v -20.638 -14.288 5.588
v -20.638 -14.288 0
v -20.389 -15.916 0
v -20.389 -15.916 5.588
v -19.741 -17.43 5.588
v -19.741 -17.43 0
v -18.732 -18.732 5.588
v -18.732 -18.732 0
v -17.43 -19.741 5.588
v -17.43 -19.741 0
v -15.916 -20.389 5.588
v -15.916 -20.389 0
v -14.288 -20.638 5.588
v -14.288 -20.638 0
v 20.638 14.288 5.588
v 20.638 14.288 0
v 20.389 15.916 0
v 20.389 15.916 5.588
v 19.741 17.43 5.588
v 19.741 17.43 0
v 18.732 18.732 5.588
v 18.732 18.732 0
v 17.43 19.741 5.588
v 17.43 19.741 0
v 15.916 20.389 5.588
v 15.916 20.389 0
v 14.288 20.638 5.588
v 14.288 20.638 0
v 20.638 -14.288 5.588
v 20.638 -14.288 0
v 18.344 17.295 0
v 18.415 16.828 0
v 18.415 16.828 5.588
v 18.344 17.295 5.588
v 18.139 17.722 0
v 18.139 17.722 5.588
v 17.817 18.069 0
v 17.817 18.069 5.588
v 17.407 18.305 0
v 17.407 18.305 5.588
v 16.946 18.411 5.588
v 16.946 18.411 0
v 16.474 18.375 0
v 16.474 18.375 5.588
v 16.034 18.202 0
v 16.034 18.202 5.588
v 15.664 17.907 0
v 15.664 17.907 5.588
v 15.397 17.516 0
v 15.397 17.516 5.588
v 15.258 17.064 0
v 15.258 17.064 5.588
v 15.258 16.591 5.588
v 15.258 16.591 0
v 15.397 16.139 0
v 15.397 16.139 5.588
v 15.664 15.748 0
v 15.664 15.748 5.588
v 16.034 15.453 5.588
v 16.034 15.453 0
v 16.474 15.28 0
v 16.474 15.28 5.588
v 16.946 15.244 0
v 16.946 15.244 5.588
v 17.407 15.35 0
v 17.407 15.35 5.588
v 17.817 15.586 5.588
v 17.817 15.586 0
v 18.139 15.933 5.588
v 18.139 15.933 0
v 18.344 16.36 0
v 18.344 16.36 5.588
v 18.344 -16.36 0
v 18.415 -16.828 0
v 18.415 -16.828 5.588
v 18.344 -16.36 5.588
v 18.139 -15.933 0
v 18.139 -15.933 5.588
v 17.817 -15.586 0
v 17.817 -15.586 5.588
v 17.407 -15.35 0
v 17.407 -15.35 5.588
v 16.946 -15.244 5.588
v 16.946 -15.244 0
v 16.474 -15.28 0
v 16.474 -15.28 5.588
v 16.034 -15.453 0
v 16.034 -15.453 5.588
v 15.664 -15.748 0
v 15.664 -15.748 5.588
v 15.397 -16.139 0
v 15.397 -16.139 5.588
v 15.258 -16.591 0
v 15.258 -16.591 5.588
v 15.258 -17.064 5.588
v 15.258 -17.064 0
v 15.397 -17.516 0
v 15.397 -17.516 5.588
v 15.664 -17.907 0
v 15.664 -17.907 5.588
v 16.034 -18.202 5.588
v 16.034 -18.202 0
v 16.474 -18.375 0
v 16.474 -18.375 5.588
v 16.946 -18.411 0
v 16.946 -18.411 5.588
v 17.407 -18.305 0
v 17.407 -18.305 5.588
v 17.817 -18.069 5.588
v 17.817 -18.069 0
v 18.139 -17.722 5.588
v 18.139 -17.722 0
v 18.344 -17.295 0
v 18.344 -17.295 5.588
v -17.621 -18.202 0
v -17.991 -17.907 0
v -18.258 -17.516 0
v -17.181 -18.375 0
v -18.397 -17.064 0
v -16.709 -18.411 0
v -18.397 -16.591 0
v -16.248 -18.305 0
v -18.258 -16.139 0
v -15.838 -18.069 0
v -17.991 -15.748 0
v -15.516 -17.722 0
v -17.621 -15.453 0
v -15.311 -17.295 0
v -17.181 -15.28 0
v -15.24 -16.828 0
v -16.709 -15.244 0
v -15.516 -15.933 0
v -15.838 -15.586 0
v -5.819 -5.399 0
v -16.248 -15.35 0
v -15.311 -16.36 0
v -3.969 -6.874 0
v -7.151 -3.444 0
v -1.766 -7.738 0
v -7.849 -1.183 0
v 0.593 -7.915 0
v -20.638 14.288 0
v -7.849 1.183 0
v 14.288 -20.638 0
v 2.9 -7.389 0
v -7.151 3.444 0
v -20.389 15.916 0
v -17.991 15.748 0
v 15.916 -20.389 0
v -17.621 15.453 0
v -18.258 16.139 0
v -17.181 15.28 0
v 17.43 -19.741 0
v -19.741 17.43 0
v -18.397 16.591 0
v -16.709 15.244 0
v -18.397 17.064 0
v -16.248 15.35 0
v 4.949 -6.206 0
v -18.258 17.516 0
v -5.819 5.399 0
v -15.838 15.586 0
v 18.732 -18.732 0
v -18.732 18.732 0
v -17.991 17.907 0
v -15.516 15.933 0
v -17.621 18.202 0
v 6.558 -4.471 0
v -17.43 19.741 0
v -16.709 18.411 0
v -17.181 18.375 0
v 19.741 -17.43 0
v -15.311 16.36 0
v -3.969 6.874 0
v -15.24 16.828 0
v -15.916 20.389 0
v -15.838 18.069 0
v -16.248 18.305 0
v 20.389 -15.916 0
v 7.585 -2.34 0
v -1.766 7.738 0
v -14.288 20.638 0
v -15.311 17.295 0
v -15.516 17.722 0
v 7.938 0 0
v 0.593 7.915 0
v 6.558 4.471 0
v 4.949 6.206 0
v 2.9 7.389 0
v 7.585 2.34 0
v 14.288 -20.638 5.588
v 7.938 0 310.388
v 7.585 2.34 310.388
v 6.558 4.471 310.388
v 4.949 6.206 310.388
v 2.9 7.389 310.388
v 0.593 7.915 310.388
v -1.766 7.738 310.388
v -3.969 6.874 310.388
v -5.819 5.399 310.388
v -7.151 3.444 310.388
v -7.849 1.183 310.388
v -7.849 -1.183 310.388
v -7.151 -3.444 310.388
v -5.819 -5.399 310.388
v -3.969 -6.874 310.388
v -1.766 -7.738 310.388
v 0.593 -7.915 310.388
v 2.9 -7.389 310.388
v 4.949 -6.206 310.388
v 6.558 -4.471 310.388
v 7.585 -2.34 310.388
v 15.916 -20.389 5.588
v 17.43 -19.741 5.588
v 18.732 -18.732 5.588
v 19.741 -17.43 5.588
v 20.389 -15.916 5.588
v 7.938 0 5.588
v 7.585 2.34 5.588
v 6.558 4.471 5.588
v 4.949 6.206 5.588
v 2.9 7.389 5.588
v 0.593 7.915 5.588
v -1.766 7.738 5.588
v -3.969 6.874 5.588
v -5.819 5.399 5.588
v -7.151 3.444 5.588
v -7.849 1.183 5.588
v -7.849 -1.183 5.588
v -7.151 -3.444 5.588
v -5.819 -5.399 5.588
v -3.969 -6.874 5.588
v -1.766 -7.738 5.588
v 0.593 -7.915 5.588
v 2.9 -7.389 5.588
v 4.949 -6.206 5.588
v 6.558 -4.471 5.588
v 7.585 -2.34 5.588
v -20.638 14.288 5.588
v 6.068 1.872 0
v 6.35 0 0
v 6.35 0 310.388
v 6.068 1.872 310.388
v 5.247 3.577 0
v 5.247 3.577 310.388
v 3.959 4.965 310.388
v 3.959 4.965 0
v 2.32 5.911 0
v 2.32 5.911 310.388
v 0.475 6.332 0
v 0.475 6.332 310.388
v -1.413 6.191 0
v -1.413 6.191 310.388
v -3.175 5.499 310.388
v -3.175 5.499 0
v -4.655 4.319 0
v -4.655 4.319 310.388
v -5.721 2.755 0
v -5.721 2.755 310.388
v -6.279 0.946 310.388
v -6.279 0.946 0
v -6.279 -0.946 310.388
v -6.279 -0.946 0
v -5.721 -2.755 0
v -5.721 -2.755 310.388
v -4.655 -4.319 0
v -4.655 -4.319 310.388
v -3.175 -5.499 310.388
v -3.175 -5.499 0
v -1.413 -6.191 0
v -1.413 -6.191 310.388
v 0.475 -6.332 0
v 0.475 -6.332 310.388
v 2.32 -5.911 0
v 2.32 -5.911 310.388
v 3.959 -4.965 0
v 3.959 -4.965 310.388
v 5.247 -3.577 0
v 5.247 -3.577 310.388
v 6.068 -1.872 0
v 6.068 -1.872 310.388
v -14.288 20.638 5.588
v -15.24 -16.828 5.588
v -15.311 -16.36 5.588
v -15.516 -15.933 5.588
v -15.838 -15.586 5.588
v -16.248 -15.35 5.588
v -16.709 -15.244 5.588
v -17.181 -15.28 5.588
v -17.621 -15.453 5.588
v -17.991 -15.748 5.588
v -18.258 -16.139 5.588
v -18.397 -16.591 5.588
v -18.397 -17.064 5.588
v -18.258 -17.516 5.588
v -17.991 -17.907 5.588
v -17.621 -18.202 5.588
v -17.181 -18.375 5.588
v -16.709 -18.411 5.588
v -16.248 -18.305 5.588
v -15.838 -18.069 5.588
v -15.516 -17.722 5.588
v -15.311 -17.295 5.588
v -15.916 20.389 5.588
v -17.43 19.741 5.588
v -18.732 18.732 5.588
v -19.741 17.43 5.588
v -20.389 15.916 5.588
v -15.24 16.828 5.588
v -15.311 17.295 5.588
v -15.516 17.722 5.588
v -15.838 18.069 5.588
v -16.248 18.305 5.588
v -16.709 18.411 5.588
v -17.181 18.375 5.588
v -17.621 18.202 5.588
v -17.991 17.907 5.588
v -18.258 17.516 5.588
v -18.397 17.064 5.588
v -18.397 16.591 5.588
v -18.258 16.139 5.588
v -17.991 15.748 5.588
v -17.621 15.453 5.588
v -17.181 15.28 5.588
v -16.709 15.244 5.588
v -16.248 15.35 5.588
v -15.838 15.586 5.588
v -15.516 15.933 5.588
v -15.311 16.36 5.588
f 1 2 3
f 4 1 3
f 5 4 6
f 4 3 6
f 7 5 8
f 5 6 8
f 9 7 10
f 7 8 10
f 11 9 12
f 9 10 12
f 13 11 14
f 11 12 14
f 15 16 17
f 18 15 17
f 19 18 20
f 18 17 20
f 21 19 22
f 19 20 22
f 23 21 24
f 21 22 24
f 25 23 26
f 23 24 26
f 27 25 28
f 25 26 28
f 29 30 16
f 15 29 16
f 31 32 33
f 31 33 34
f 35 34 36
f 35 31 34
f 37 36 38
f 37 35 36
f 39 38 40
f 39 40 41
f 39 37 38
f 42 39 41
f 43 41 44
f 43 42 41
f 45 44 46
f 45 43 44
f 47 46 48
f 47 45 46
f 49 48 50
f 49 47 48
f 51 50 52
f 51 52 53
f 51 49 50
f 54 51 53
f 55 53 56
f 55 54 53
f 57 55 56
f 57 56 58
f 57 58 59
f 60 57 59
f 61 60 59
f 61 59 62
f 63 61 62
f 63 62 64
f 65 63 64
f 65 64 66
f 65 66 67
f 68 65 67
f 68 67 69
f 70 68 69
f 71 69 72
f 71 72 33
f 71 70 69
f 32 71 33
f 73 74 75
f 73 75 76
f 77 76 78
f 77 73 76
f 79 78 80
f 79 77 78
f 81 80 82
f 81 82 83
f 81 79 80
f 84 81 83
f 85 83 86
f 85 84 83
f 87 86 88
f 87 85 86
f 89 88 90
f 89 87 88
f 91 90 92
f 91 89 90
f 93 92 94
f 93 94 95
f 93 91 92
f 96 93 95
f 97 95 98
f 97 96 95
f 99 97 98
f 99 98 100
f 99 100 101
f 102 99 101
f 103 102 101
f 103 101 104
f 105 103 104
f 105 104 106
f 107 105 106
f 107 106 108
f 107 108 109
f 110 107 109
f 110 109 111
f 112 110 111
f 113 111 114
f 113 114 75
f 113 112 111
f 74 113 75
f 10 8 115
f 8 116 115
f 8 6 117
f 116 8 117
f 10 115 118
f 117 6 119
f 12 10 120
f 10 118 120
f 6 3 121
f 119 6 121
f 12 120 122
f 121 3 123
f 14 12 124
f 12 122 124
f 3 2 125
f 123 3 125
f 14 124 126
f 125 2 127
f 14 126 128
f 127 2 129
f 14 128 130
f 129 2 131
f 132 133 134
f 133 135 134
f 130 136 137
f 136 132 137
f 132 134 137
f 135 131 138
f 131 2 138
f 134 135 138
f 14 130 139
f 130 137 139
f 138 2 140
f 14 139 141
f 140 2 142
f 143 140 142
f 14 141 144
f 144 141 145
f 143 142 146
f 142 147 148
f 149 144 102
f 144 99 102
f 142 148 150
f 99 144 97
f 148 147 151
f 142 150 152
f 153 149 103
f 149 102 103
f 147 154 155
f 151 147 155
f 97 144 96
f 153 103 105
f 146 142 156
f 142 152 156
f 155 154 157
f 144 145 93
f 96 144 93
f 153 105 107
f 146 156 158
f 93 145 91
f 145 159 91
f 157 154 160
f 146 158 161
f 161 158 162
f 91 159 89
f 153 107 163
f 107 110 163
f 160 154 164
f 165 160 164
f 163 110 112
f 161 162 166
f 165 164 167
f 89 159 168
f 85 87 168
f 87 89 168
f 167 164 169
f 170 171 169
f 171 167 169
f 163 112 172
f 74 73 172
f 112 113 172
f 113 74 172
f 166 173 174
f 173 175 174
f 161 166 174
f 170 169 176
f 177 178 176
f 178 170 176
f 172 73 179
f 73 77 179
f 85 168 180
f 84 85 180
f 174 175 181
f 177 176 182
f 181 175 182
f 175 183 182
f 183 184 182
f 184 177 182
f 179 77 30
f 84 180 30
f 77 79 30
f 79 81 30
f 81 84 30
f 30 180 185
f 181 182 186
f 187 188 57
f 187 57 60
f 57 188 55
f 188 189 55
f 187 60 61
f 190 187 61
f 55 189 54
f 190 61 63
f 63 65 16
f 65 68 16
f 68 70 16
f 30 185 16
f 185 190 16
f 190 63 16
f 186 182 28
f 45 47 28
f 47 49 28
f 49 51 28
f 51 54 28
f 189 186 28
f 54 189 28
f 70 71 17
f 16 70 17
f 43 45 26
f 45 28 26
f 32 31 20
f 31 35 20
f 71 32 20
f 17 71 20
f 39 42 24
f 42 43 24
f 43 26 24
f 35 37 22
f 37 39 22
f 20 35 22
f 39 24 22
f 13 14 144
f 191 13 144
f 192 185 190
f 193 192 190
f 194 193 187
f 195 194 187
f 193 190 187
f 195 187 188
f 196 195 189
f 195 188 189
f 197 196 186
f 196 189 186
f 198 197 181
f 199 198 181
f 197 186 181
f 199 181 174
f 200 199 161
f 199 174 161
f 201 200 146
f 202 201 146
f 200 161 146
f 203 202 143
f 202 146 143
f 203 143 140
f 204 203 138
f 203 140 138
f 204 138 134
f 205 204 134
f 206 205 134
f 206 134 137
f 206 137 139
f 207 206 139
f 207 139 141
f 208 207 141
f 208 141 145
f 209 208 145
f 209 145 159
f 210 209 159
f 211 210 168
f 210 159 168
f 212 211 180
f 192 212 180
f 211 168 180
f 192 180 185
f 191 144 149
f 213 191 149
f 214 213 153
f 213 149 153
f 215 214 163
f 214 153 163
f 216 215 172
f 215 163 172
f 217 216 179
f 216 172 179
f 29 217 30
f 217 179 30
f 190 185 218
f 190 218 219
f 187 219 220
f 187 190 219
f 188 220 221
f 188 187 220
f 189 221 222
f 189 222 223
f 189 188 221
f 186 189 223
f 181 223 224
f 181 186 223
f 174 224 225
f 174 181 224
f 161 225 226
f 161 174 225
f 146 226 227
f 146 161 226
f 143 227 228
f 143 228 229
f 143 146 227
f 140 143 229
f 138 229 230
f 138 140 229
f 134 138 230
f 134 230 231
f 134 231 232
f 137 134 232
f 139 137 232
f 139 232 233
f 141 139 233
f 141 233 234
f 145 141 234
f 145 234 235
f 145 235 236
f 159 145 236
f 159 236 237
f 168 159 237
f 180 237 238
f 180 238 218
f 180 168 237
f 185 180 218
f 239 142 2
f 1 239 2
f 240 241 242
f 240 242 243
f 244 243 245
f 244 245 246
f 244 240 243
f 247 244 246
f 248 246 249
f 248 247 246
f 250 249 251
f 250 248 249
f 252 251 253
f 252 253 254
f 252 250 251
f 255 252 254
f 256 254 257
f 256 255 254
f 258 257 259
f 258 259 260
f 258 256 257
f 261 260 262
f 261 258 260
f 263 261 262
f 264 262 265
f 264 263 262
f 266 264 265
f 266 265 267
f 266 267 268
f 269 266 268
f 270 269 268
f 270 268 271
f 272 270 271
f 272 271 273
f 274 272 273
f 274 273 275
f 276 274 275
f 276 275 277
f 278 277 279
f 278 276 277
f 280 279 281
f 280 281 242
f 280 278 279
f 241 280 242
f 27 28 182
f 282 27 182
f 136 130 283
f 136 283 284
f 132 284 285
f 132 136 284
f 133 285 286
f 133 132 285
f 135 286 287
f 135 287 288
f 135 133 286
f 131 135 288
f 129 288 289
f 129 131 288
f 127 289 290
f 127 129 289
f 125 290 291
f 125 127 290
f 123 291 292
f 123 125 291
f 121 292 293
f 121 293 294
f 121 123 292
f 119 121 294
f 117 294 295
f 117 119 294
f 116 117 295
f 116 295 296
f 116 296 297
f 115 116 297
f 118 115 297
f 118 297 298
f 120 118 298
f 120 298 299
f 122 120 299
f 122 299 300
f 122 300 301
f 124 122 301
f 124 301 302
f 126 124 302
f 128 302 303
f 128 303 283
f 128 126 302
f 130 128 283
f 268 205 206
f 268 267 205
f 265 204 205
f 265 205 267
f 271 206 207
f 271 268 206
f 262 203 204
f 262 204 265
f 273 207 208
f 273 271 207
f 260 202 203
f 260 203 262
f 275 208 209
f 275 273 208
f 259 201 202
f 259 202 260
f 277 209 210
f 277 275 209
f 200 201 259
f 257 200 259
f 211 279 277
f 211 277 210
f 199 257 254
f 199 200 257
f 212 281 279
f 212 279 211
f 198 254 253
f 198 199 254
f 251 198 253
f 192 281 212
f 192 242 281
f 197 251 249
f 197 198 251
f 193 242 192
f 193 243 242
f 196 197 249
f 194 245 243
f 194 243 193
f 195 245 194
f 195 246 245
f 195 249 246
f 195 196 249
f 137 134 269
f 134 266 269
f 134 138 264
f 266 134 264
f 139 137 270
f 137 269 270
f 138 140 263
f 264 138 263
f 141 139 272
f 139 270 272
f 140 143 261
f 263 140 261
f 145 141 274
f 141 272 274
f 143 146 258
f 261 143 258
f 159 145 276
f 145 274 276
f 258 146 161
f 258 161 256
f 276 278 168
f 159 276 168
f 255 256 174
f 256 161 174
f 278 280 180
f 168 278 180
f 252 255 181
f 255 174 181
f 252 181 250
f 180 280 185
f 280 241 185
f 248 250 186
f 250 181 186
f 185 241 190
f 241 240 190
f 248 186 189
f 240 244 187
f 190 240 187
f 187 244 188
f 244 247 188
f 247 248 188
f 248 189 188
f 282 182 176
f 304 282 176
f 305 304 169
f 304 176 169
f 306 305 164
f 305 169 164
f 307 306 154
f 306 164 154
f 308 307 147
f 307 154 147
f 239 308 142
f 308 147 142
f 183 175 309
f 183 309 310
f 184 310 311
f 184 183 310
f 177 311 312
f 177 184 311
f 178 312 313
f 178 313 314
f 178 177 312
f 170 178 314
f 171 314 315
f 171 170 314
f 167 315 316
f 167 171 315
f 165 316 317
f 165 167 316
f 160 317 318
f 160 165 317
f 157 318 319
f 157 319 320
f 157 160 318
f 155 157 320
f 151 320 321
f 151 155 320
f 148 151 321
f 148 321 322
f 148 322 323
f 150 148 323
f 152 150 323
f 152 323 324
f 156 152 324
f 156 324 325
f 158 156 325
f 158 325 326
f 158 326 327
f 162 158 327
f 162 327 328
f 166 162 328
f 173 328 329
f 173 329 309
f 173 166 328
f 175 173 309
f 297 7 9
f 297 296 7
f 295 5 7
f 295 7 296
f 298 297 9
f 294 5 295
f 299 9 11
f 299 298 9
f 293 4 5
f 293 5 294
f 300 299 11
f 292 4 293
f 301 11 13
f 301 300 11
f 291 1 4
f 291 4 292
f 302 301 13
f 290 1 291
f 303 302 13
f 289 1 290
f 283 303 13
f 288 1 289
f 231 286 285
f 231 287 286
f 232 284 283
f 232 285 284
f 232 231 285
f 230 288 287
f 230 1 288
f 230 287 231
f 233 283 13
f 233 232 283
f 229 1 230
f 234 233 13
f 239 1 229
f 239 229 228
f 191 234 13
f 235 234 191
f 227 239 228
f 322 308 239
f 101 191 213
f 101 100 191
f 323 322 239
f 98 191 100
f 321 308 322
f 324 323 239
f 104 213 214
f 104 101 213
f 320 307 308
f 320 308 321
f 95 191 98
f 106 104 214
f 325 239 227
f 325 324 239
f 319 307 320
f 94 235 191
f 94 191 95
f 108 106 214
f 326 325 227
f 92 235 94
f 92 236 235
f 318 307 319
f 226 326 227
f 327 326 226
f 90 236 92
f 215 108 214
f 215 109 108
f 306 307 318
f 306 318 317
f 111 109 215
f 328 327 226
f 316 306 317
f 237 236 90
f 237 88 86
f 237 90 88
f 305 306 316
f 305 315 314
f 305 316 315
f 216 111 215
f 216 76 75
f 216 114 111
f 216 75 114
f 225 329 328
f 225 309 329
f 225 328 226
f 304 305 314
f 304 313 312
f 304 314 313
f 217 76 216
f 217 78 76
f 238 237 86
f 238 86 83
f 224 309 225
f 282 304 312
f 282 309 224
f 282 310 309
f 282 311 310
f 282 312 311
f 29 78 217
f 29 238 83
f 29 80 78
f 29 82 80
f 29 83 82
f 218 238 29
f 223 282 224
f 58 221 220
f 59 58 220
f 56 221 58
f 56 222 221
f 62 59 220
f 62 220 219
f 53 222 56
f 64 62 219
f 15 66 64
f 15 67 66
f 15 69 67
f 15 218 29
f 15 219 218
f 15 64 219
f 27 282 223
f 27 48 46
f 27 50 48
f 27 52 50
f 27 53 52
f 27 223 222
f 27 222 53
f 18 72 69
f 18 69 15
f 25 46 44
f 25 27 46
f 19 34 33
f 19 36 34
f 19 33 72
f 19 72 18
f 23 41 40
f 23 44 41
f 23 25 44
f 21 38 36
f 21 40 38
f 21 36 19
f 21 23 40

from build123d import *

# Parameters (mm, degrees)
F0_R     = 1.5875
F0_R_2   = 7.9375
F1_DEPTH = 5.588
F0_R_3   = 6.35
F2_DEPTH = 310.388


with BuildPart() as f1:
    # F0 (on Top) → F1 (new body)
    with BuildSketch(Plane.XY):
        with BuildLine():
            Line((14.2875, 20.6375), (-14.2875, 20.6375))
            ThreePointArc((-14.2875, 20.6375), (-18.7325, 18.7325), (-20.6375, 14.2875))
            Line((-20.6375, 14.2875), (-20.6375, -14.2875))
            ThreePointArc((-20.6375, -14.2875), (-18.7325, -18.7325), (-14.2875, -20.6375))
            Line((-14.2875, -20.6375), (14.2875, -20.6375))
            ThreePointArc((14.2875, -20.6375), (18.7325, -18.7325), (20.6375, -14.2875))
            Line((20.6375, -14.2875), (20.6375, 14.2875))
            ThreePointArc((20.6375, 14.2875), (18.7325, 18.7325), (14.2875, 20.6375))
        make_face()
        with Locations((-16.8275, -16.8275)):
            Circle(F0_R, mode=Mode.SUBTRACT)
        with Locations((16.8275, -16.8275)):
            Circle(F0_R, mode=Mode.SUBTRACT)
        with Locations((-16.8275, 16.8275)):
            Circle(F0_R, mode=Mode.SUBTRACT)
        Circle(F0_R_2, mode=Mode.SUBTRACT)
        with Locations((16.8275, 16.8275)):
            Circle(F0_R, mode=Mode.SUBTRACT)
    extrude(amount=F1_DEPTH)


with BuildPart() as f2:
    # F0 (on Top) → F2 (new body)
    with BuildSketch(Plane.XY):
        Circle(F0_R_2)
        Circle(F0_R_3, mode=Mode.SUBTRACT)
    extrude(amount=F2_DEPTH)


solid = Compound([f1.part, f2.part])
